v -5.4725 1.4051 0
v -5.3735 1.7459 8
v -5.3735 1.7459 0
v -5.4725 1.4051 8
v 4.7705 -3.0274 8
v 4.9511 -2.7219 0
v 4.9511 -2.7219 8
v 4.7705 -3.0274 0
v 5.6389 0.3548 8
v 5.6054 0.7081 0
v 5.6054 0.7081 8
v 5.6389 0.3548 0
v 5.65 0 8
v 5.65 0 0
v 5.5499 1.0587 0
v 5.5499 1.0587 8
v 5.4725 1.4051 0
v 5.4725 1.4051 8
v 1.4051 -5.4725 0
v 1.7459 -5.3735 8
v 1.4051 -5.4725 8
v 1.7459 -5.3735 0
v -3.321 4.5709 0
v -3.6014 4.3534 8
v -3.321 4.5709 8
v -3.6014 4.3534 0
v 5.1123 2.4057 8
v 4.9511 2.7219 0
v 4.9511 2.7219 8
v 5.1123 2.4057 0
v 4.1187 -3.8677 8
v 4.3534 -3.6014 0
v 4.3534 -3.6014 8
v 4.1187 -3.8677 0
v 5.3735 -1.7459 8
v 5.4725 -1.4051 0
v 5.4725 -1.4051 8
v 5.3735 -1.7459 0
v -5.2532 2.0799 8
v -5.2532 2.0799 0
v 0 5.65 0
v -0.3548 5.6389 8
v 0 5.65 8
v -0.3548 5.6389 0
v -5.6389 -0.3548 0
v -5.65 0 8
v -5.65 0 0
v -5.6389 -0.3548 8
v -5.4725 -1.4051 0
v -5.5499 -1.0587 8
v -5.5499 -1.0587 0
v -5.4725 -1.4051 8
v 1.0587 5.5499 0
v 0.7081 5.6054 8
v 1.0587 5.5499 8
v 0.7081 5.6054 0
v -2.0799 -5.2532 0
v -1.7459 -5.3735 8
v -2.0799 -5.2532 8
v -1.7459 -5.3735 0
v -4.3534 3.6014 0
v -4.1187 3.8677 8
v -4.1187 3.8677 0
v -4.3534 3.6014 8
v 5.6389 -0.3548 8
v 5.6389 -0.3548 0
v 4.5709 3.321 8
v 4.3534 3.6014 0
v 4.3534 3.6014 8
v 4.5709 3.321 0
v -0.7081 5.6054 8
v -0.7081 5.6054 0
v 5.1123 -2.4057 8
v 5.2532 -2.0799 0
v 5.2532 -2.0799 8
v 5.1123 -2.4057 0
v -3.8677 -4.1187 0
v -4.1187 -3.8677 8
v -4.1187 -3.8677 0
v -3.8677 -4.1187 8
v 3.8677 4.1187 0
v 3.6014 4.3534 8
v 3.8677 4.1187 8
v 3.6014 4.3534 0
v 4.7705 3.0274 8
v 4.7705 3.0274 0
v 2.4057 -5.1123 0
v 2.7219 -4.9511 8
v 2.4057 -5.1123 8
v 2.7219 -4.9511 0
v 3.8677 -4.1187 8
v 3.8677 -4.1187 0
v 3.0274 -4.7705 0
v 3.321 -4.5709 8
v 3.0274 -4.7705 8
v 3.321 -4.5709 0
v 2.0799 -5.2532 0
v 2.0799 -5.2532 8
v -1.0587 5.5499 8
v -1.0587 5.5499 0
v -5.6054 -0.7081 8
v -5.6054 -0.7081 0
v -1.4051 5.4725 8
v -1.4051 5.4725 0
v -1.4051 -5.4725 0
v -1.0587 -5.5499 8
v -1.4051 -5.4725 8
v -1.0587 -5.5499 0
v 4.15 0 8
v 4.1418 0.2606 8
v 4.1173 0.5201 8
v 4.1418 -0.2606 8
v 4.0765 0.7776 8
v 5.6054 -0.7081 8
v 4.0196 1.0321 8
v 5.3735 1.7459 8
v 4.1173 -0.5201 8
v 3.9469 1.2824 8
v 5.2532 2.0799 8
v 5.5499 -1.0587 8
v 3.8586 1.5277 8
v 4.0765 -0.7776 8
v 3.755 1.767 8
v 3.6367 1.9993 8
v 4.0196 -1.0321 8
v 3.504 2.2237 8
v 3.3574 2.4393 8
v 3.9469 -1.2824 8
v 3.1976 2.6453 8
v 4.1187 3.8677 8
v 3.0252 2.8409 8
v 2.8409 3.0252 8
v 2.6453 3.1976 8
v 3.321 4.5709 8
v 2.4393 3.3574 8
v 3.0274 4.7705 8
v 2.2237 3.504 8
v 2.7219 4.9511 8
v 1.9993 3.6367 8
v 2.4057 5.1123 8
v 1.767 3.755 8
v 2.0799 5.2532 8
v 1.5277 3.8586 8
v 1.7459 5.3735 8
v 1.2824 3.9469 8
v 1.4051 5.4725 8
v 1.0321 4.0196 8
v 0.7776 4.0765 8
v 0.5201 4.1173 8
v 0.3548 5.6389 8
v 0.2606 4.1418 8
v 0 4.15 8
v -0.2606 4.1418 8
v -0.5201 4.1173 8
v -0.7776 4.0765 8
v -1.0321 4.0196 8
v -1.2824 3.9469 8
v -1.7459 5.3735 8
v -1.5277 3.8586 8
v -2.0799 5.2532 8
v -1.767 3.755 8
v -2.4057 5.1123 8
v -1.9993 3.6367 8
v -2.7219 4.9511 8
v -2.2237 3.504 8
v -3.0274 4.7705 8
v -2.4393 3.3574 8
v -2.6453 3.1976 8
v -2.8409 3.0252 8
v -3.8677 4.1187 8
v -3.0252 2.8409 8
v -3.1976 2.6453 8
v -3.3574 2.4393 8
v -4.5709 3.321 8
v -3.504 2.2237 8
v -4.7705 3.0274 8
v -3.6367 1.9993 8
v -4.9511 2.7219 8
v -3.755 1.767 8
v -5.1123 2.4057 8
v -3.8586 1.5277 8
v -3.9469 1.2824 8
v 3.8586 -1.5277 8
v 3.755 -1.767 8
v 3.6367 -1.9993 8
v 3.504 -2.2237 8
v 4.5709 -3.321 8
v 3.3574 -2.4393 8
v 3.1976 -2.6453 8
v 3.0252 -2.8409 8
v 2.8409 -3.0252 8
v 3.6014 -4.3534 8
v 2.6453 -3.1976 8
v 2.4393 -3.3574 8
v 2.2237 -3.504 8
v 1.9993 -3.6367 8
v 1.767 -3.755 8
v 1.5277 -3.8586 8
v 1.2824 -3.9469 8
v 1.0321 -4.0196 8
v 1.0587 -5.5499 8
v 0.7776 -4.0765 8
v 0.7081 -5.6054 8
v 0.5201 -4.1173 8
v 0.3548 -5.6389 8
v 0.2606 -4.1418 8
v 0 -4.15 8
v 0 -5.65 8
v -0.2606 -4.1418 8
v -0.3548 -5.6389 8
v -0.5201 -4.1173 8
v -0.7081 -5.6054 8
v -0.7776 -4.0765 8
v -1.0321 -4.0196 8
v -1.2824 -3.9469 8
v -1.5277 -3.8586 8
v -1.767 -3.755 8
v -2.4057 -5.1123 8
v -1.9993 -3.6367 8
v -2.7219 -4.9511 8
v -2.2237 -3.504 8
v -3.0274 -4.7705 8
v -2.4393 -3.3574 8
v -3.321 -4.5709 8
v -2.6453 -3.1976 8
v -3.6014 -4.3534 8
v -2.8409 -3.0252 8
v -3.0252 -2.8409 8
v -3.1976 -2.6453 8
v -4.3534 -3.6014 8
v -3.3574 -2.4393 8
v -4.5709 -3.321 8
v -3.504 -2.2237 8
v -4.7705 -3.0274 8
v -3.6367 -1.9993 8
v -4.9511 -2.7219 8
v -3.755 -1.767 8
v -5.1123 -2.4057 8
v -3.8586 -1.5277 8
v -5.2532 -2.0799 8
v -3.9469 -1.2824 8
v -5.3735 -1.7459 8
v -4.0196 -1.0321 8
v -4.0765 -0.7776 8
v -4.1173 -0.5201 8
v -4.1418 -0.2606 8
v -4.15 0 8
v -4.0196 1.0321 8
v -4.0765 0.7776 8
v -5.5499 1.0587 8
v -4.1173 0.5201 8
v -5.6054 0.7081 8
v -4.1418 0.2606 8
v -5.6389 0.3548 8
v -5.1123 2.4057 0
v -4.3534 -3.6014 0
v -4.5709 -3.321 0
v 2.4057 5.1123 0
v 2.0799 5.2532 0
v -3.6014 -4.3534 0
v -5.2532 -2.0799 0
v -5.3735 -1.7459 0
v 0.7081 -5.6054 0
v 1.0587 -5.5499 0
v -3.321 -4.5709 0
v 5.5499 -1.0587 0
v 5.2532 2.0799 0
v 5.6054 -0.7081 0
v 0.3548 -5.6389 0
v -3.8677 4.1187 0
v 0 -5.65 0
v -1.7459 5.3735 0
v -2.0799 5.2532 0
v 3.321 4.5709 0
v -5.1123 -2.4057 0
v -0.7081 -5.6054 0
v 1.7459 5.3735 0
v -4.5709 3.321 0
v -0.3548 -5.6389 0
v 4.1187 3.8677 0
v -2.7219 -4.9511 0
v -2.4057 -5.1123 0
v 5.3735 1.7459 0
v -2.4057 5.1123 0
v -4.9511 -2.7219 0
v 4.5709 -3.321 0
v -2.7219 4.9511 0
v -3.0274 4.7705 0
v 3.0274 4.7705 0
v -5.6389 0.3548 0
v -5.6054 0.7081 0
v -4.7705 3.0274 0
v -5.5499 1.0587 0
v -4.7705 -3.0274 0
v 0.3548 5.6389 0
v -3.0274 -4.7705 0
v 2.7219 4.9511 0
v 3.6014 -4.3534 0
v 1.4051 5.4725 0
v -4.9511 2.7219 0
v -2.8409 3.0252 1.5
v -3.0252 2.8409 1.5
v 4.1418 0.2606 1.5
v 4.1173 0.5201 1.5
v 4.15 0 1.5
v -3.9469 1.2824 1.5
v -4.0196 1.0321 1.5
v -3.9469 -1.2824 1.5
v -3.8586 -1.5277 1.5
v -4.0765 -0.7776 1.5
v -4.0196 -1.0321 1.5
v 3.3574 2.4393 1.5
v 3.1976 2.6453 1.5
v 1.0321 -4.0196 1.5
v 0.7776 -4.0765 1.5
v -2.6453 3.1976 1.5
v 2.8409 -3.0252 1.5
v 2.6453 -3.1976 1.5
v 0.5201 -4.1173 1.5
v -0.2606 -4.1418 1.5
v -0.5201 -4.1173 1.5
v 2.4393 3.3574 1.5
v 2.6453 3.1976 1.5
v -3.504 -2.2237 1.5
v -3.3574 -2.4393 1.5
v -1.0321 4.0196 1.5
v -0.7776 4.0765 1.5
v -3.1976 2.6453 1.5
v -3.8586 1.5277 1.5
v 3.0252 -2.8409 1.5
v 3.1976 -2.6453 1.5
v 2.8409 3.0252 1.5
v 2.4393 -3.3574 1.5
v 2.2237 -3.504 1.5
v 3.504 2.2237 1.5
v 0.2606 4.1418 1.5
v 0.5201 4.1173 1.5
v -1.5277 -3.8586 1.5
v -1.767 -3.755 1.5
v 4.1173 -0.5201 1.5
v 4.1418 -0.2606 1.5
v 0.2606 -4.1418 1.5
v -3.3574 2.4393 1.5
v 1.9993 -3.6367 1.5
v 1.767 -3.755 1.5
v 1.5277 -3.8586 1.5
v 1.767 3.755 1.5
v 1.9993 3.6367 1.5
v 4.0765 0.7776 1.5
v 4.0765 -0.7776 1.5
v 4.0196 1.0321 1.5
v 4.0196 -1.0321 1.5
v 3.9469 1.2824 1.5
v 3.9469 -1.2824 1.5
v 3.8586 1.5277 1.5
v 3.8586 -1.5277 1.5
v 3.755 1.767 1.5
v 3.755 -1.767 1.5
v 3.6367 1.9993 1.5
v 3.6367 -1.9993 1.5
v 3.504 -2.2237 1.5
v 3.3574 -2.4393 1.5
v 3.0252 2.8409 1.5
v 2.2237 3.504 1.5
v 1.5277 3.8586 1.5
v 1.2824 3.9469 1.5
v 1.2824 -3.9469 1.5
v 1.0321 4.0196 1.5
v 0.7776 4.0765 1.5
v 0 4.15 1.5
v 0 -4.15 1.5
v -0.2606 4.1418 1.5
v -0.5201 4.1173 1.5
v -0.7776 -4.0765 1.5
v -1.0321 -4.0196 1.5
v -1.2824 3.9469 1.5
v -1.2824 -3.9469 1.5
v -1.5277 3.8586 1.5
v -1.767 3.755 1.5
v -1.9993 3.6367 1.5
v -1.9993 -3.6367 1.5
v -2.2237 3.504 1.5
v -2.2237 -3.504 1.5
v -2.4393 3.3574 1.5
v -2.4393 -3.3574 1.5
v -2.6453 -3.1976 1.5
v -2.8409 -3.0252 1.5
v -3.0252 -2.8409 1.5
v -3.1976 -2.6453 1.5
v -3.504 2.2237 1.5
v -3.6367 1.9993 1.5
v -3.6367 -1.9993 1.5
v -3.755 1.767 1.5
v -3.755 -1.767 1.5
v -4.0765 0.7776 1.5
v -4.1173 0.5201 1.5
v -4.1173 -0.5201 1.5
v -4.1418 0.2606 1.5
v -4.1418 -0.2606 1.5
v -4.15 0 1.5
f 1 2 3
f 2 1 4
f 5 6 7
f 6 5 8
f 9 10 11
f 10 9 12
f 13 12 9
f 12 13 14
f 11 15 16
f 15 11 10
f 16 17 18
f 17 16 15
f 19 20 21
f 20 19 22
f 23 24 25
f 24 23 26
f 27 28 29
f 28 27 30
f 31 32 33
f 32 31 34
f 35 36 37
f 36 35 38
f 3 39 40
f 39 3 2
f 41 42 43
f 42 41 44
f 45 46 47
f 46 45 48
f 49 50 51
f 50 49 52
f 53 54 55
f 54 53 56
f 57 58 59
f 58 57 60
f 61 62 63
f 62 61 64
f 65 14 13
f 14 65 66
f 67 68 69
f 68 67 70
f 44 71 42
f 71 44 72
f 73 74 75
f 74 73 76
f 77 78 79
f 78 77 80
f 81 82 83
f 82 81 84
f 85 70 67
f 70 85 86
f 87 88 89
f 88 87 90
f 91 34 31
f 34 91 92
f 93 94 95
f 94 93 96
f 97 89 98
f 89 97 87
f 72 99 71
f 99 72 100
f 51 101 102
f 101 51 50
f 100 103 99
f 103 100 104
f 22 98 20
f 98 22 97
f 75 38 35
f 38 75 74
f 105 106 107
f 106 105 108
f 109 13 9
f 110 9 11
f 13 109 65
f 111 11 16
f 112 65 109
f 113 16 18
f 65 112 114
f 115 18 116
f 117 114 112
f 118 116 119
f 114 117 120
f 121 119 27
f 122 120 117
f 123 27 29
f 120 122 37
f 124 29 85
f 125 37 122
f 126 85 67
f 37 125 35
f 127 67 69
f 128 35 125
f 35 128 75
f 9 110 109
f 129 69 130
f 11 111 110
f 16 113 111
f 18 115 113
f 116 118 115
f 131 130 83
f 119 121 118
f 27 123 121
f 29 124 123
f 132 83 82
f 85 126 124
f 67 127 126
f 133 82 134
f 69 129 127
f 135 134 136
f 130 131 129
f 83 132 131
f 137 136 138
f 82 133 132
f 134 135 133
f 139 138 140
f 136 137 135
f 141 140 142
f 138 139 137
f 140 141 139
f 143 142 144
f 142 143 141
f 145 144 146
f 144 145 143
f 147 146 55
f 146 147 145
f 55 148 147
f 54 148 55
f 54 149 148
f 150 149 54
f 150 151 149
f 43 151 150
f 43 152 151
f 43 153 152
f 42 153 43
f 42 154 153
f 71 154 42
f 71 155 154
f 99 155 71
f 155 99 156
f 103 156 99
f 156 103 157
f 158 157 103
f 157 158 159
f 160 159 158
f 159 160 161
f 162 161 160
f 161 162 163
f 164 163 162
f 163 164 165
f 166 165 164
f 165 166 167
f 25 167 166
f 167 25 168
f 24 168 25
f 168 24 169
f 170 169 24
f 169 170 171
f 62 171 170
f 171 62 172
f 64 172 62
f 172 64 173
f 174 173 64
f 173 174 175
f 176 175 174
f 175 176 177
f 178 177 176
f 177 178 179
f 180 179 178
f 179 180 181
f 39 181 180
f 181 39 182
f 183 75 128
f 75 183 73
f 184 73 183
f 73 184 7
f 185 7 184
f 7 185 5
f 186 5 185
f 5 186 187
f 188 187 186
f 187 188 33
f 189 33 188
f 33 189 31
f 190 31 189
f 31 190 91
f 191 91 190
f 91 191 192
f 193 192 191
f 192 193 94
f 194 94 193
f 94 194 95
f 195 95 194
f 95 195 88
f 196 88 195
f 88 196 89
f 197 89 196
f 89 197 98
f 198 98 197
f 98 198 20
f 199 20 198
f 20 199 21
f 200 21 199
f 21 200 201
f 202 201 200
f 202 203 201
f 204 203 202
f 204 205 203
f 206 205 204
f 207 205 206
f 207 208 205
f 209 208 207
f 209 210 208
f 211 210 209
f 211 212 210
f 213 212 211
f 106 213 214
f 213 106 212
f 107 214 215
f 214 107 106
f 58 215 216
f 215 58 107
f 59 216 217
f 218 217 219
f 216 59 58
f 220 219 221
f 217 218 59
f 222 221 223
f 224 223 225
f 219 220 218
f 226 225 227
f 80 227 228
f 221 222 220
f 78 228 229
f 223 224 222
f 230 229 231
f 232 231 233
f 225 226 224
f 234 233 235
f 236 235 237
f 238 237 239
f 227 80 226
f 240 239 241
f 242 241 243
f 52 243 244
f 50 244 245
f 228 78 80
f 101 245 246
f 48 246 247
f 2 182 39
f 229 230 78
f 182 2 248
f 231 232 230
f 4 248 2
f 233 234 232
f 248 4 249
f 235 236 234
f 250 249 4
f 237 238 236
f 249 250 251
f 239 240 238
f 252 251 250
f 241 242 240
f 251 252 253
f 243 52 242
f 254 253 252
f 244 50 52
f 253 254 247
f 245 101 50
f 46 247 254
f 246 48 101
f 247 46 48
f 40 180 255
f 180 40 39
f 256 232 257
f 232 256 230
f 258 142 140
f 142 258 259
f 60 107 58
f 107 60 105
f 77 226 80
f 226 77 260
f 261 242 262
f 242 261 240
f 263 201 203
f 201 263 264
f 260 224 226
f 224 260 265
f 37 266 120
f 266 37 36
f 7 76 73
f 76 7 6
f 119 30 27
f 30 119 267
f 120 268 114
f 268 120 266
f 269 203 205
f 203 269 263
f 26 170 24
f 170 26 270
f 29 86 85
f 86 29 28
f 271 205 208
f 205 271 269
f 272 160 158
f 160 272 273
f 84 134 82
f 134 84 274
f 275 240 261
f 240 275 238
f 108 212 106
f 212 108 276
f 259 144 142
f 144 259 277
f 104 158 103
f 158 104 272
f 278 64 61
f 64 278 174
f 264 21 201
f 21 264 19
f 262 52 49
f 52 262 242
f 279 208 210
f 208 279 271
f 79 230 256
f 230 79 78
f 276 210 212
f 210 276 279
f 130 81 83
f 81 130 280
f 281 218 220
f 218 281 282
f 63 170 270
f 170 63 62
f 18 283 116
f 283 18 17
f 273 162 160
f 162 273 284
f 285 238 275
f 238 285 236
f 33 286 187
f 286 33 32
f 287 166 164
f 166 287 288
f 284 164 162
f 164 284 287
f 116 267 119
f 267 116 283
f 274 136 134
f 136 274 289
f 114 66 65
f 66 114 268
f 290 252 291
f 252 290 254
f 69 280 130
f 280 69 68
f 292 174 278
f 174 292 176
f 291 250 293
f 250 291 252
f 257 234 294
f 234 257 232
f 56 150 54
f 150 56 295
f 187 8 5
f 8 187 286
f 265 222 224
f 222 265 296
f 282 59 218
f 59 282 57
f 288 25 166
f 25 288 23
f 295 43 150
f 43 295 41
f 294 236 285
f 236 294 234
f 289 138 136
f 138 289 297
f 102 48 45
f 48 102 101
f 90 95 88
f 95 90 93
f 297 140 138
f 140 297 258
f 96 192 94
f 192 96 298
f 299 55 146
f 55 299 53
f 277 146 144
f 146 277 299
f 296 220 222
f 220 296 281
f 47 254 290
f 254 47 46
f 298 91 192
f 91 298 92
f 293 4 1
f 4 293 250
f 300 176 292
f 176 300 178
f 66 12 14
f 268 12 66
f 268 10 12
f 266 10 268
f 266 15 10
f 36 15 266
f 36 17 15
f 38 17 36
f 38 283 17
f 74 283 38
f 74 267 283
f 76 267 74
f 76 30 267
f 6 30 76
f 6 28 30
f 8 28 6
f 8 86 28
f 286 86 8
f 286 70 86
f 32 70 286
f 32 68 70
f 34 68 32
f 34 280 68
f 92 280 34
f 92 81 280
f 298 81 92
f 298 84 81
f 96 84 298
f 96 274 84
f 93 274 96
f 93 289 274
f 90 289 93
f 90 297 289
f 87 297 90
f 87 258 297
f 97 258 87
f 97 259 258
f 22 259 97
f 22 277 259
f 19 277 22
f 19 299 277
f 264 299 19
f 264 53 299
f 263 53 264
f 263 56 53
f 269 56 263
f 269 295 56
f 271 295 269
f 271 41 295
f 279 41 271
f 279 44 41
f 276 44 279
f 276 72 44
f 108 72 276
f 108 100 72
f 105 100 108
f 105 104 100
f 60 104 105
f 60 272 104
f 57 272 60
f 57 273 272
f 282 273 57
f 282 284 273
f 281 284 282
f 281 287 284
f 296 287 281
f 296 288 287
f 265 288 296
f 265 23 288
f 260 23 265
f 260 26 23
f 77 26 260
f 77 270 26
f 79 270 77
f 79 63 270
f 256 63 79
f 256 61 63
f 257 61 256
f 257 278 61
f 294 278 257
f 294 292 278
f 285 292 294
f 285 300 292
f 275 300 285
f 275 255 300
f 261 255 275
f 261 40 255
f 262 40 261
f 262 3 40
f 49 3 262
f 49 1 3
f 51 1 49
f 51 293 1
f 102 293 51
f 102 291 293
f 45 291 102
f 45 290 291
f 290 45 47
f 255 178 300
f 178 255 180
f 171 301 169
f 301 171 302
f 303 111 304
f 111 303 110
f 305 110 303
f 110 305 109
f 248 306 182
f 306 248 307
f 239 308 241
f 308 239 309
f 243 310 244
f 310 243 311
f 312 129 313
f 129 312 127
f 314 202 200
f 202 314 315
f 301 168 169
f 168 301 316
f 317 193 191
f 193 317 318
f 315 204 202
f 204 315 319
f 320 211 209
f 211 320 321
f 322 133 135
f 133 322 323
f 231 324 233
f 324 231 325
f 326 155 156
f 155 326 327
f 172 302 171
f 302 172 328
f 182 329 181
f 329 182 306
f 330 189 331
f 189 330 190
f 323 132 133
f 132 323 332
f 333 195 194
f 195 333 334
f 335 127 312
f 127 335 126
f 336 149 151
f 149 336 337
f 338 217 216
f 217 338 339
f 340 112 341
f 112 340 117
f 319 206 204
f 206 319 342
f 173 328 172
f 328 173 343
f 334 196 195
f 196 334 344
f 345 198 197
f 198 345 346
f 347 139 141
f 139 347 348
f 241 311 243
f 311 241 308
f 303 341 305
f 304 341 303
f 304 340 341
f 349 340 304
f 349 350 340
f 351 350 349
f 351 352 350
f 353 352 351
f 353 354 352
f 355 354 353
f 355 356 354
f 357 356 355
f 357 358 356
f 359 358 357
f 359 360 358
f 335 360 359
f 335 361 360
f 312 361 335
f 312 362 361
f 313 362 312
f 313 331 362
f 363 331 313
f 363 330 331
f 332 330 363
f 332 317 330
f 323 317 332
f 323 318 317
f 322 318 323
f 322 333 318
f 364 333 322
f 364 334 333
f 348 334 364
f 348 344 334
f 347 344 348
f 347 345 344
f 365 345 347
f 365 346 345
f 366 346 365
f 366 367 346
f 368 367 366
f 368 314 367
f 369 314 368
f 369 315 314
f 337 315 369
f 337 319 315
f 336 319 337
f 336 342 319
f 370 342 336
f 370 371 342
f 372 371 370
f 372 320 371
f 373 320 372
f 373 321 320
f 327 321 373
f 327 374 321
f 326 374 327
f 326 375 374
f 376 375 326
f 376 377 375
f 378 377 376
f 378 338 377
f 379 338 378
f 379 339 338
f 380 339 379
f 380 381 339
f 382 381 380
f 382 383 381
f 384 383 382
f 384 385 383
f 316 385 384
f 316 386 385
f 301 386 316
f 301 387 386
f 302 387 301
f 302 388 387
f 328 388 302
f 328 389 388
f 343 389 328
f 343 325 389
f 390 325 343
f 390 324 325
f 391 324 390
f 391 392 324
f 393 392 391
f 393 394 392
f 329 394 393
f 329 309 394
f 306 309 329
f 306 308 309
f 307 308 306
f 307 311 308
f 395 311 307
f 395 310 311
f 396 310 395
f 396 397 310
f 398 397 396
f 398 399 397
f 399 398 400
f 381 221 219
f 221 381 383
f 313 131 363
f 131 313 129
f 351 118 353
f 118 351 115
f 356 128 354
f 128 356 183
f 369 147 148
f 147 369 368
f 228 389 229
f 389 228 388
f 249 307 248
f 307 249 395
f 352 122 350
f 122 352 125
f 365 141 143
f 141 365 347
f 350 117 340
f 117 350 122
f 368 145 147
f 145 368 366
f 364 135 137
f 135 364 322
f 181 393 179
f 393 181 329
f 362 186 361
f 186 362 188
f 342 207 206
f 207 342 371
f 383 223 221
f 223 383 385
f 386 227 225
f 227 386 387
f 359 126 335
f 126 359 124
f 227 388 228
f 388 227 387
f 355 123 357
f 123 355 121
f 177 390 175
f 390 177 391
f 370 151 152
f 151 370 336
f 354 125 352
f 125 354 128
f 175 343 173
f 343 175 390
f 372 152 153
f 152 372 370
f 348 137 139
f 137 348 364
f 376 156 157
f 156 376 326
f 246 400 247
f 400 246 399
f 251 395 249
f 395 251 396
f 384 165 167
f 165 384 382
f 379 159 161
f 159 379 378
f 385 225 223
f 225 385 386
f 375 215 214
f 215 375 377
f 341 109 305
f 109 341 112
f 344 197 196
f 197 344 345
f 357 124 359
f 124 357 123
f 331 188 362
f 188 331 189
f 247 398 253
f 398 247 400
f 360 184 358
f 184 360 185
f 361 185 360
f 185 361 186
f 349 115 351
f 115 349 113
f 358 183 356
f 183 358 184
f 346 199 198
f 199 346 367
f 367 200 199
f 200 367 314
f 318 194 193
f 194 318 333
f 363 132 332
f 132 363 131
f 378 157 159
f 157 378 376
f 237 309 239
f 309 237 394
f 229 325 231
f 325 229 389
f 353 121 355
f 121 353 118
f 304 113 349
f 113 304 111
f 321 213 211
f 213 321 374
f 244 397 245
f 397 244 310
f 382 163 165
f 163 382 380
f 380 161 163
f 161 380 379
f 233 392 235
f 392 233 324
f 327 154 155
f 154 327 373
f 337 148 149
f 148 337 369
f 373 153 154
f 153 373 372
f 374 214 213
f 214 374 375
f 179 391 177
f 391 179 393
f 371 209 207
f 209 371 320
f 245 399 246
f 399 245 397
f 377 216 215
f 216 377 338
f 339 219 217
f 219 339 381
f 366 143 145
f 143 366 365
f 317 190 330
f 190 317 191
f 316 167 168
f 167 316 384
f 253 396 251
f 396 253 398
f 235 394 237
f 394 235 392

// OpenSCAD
/* ********************
//
// End Cap for Axle - Endkappe für Rundholz
// CC-BY-SA October 2017 by ohuf@Thingiverse
//
// www.thingiverse.com/thing:2573435

(English text below...)

Für meinen Spulenhalter (für Elekronikdrähte) 
benutzte ich einen Buche-Rundstab aus dem Baumarkt als Achse.
Um die Achse vor dem Herausfallen zu sichern, habe ich diese Endkappen gedruckt und aufgeschoben.

-----

These are simple end caps for wood axles.
I made them in order to secure the axle of my spool holder.

Enjoy, have fun remixing and let me know when you've made one, and what for!

// Version 2 - 2017-09-07
//
// 
// License: CC-BY-SA
// read all about it here: http://creativecommons.org/licenses/by-sa/4.0/
// ********************** */

/* [cap size] */
// Length of the cap || Länge der Kappe
height = 8;	 

// The inner diameter of the cap corresponds to the outer diameter of your axle || Der innere Durchmesser der Kappe entspricht dem Durchmesser deines Rundholzes
innerDia = 8.3; 

// The thickness of the cap's wall || Die Wandstärke der Kappe
wall = 1.5; 

/* [Hidden] */
$fn=100;
outerDia = innerDia + 2*wall;
ix=0.005;	// This is just some static value to beautify the cutout

difference(){
cylinder(d=outerDia, h=height);
	translate([0, 0, wall])
cylinder(d=innerDia,h=height-wall+ix);
}
